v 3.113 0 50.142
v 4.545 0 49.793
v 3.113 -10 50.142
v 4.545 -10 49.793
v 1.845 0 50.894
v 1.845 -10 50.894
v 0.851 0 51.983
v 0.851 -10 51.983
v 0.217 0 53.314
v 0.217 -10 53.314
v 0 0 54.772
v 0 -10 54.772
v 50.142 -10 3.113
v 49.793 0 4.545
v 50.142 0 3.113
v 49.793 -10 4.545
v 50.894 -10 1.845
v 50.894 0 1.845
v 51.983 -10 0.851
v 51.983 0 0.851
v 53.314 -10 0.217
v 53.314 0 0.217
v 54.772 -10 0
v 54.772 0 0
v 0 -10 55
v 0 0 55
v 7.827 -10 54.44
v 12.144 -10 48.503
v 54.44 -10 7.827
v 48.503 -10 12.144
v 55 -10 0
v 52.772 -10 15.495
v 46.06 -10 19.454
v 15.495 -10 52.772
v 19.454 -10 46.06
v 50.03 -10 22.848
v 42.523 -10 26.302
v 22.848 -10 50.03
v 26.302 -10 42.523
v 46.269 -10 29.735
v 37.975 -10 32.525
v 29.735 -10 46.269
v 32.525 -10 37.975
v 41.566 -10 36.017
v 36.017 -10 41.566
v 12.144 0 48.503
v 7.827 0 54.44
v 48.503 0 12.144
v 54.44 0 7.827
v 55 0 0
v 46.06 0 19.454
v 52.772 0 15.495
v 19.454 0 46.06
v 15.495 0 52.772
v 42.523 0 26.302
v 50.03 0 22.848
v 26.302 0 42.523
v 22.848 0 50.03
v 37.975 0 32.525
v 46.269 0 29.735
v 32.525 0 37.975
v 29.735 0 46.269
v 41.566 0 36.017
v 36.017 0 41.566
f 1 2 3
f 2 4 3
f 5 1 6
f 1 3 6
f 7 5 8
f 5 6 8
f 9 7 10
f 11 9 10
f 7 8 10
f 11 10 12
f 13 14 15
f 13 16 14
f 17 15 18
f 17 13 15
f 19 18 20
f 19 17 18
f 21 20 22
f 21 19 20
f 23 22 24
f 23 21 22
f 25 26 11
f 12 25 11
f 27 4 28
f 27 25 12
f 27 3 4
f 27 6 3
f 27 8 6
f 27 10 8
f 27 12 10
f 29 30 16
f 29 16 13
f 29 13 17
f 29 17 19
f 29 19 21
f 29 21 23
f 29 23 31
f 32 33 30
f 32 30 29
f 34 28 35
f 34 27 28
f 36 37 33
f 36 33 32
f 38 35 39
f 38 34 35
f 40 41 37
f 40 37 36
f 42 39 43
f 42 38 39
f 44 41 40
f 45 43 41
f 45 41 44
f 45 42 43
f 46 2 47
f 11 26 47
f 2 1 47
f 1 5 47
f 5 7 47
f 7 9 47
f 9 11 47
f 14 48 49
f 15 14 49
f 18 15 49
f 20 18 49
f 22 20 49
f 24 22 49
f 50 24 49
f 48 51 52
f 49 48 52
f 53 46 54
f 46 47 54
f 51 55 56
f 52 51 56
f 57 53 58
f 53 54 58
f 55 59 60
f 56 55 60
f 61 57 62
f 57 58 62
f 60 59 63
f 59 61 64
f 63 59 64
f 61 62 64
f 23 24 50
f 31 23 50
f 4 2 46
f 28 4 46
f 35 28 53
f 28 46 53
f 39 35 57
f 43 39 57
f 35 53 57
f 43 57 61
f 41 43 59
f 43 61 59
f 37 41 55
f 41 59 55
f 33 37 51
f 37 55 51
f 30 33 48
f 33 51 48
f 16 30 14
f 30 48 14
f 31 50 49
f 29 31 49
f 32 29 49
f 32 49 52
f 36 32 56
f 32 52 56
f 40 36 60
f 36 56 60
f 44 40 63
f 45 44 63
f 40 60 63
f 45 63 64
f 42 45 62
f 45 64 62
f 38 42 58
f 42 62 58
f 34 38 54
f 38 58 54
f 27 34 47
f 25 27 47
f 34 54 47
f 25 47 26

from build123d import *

# Parameters (mm, degrees)
F1_DEPTH = 10
F2_R     = 5


with BuildPart() as f1:
    # F0 (on Front) → F1 (new body)
    with BuildSketch(Plane.XZ):
        with BuildLine():
            ThreePointArc((0, 50), (35.355339, 35.355339), (50, 0))
            Line((50, 0), (55, 0))
            ThreePointArc((55, 0), (38.890873, 38.890873), (0, 55))
            Line((0, 55), (0, 50))
        make_face()
    extrude(amount=F1_DEPTH)

    # F2
    f2_edges = [f1.edges().sort_by_distance(p)[0] for p in [
        (50, -5, 0),
        (0, -5, 50),
    ]]
    fillet(f2_edges, radius=F2_R)


solid = f1.part
